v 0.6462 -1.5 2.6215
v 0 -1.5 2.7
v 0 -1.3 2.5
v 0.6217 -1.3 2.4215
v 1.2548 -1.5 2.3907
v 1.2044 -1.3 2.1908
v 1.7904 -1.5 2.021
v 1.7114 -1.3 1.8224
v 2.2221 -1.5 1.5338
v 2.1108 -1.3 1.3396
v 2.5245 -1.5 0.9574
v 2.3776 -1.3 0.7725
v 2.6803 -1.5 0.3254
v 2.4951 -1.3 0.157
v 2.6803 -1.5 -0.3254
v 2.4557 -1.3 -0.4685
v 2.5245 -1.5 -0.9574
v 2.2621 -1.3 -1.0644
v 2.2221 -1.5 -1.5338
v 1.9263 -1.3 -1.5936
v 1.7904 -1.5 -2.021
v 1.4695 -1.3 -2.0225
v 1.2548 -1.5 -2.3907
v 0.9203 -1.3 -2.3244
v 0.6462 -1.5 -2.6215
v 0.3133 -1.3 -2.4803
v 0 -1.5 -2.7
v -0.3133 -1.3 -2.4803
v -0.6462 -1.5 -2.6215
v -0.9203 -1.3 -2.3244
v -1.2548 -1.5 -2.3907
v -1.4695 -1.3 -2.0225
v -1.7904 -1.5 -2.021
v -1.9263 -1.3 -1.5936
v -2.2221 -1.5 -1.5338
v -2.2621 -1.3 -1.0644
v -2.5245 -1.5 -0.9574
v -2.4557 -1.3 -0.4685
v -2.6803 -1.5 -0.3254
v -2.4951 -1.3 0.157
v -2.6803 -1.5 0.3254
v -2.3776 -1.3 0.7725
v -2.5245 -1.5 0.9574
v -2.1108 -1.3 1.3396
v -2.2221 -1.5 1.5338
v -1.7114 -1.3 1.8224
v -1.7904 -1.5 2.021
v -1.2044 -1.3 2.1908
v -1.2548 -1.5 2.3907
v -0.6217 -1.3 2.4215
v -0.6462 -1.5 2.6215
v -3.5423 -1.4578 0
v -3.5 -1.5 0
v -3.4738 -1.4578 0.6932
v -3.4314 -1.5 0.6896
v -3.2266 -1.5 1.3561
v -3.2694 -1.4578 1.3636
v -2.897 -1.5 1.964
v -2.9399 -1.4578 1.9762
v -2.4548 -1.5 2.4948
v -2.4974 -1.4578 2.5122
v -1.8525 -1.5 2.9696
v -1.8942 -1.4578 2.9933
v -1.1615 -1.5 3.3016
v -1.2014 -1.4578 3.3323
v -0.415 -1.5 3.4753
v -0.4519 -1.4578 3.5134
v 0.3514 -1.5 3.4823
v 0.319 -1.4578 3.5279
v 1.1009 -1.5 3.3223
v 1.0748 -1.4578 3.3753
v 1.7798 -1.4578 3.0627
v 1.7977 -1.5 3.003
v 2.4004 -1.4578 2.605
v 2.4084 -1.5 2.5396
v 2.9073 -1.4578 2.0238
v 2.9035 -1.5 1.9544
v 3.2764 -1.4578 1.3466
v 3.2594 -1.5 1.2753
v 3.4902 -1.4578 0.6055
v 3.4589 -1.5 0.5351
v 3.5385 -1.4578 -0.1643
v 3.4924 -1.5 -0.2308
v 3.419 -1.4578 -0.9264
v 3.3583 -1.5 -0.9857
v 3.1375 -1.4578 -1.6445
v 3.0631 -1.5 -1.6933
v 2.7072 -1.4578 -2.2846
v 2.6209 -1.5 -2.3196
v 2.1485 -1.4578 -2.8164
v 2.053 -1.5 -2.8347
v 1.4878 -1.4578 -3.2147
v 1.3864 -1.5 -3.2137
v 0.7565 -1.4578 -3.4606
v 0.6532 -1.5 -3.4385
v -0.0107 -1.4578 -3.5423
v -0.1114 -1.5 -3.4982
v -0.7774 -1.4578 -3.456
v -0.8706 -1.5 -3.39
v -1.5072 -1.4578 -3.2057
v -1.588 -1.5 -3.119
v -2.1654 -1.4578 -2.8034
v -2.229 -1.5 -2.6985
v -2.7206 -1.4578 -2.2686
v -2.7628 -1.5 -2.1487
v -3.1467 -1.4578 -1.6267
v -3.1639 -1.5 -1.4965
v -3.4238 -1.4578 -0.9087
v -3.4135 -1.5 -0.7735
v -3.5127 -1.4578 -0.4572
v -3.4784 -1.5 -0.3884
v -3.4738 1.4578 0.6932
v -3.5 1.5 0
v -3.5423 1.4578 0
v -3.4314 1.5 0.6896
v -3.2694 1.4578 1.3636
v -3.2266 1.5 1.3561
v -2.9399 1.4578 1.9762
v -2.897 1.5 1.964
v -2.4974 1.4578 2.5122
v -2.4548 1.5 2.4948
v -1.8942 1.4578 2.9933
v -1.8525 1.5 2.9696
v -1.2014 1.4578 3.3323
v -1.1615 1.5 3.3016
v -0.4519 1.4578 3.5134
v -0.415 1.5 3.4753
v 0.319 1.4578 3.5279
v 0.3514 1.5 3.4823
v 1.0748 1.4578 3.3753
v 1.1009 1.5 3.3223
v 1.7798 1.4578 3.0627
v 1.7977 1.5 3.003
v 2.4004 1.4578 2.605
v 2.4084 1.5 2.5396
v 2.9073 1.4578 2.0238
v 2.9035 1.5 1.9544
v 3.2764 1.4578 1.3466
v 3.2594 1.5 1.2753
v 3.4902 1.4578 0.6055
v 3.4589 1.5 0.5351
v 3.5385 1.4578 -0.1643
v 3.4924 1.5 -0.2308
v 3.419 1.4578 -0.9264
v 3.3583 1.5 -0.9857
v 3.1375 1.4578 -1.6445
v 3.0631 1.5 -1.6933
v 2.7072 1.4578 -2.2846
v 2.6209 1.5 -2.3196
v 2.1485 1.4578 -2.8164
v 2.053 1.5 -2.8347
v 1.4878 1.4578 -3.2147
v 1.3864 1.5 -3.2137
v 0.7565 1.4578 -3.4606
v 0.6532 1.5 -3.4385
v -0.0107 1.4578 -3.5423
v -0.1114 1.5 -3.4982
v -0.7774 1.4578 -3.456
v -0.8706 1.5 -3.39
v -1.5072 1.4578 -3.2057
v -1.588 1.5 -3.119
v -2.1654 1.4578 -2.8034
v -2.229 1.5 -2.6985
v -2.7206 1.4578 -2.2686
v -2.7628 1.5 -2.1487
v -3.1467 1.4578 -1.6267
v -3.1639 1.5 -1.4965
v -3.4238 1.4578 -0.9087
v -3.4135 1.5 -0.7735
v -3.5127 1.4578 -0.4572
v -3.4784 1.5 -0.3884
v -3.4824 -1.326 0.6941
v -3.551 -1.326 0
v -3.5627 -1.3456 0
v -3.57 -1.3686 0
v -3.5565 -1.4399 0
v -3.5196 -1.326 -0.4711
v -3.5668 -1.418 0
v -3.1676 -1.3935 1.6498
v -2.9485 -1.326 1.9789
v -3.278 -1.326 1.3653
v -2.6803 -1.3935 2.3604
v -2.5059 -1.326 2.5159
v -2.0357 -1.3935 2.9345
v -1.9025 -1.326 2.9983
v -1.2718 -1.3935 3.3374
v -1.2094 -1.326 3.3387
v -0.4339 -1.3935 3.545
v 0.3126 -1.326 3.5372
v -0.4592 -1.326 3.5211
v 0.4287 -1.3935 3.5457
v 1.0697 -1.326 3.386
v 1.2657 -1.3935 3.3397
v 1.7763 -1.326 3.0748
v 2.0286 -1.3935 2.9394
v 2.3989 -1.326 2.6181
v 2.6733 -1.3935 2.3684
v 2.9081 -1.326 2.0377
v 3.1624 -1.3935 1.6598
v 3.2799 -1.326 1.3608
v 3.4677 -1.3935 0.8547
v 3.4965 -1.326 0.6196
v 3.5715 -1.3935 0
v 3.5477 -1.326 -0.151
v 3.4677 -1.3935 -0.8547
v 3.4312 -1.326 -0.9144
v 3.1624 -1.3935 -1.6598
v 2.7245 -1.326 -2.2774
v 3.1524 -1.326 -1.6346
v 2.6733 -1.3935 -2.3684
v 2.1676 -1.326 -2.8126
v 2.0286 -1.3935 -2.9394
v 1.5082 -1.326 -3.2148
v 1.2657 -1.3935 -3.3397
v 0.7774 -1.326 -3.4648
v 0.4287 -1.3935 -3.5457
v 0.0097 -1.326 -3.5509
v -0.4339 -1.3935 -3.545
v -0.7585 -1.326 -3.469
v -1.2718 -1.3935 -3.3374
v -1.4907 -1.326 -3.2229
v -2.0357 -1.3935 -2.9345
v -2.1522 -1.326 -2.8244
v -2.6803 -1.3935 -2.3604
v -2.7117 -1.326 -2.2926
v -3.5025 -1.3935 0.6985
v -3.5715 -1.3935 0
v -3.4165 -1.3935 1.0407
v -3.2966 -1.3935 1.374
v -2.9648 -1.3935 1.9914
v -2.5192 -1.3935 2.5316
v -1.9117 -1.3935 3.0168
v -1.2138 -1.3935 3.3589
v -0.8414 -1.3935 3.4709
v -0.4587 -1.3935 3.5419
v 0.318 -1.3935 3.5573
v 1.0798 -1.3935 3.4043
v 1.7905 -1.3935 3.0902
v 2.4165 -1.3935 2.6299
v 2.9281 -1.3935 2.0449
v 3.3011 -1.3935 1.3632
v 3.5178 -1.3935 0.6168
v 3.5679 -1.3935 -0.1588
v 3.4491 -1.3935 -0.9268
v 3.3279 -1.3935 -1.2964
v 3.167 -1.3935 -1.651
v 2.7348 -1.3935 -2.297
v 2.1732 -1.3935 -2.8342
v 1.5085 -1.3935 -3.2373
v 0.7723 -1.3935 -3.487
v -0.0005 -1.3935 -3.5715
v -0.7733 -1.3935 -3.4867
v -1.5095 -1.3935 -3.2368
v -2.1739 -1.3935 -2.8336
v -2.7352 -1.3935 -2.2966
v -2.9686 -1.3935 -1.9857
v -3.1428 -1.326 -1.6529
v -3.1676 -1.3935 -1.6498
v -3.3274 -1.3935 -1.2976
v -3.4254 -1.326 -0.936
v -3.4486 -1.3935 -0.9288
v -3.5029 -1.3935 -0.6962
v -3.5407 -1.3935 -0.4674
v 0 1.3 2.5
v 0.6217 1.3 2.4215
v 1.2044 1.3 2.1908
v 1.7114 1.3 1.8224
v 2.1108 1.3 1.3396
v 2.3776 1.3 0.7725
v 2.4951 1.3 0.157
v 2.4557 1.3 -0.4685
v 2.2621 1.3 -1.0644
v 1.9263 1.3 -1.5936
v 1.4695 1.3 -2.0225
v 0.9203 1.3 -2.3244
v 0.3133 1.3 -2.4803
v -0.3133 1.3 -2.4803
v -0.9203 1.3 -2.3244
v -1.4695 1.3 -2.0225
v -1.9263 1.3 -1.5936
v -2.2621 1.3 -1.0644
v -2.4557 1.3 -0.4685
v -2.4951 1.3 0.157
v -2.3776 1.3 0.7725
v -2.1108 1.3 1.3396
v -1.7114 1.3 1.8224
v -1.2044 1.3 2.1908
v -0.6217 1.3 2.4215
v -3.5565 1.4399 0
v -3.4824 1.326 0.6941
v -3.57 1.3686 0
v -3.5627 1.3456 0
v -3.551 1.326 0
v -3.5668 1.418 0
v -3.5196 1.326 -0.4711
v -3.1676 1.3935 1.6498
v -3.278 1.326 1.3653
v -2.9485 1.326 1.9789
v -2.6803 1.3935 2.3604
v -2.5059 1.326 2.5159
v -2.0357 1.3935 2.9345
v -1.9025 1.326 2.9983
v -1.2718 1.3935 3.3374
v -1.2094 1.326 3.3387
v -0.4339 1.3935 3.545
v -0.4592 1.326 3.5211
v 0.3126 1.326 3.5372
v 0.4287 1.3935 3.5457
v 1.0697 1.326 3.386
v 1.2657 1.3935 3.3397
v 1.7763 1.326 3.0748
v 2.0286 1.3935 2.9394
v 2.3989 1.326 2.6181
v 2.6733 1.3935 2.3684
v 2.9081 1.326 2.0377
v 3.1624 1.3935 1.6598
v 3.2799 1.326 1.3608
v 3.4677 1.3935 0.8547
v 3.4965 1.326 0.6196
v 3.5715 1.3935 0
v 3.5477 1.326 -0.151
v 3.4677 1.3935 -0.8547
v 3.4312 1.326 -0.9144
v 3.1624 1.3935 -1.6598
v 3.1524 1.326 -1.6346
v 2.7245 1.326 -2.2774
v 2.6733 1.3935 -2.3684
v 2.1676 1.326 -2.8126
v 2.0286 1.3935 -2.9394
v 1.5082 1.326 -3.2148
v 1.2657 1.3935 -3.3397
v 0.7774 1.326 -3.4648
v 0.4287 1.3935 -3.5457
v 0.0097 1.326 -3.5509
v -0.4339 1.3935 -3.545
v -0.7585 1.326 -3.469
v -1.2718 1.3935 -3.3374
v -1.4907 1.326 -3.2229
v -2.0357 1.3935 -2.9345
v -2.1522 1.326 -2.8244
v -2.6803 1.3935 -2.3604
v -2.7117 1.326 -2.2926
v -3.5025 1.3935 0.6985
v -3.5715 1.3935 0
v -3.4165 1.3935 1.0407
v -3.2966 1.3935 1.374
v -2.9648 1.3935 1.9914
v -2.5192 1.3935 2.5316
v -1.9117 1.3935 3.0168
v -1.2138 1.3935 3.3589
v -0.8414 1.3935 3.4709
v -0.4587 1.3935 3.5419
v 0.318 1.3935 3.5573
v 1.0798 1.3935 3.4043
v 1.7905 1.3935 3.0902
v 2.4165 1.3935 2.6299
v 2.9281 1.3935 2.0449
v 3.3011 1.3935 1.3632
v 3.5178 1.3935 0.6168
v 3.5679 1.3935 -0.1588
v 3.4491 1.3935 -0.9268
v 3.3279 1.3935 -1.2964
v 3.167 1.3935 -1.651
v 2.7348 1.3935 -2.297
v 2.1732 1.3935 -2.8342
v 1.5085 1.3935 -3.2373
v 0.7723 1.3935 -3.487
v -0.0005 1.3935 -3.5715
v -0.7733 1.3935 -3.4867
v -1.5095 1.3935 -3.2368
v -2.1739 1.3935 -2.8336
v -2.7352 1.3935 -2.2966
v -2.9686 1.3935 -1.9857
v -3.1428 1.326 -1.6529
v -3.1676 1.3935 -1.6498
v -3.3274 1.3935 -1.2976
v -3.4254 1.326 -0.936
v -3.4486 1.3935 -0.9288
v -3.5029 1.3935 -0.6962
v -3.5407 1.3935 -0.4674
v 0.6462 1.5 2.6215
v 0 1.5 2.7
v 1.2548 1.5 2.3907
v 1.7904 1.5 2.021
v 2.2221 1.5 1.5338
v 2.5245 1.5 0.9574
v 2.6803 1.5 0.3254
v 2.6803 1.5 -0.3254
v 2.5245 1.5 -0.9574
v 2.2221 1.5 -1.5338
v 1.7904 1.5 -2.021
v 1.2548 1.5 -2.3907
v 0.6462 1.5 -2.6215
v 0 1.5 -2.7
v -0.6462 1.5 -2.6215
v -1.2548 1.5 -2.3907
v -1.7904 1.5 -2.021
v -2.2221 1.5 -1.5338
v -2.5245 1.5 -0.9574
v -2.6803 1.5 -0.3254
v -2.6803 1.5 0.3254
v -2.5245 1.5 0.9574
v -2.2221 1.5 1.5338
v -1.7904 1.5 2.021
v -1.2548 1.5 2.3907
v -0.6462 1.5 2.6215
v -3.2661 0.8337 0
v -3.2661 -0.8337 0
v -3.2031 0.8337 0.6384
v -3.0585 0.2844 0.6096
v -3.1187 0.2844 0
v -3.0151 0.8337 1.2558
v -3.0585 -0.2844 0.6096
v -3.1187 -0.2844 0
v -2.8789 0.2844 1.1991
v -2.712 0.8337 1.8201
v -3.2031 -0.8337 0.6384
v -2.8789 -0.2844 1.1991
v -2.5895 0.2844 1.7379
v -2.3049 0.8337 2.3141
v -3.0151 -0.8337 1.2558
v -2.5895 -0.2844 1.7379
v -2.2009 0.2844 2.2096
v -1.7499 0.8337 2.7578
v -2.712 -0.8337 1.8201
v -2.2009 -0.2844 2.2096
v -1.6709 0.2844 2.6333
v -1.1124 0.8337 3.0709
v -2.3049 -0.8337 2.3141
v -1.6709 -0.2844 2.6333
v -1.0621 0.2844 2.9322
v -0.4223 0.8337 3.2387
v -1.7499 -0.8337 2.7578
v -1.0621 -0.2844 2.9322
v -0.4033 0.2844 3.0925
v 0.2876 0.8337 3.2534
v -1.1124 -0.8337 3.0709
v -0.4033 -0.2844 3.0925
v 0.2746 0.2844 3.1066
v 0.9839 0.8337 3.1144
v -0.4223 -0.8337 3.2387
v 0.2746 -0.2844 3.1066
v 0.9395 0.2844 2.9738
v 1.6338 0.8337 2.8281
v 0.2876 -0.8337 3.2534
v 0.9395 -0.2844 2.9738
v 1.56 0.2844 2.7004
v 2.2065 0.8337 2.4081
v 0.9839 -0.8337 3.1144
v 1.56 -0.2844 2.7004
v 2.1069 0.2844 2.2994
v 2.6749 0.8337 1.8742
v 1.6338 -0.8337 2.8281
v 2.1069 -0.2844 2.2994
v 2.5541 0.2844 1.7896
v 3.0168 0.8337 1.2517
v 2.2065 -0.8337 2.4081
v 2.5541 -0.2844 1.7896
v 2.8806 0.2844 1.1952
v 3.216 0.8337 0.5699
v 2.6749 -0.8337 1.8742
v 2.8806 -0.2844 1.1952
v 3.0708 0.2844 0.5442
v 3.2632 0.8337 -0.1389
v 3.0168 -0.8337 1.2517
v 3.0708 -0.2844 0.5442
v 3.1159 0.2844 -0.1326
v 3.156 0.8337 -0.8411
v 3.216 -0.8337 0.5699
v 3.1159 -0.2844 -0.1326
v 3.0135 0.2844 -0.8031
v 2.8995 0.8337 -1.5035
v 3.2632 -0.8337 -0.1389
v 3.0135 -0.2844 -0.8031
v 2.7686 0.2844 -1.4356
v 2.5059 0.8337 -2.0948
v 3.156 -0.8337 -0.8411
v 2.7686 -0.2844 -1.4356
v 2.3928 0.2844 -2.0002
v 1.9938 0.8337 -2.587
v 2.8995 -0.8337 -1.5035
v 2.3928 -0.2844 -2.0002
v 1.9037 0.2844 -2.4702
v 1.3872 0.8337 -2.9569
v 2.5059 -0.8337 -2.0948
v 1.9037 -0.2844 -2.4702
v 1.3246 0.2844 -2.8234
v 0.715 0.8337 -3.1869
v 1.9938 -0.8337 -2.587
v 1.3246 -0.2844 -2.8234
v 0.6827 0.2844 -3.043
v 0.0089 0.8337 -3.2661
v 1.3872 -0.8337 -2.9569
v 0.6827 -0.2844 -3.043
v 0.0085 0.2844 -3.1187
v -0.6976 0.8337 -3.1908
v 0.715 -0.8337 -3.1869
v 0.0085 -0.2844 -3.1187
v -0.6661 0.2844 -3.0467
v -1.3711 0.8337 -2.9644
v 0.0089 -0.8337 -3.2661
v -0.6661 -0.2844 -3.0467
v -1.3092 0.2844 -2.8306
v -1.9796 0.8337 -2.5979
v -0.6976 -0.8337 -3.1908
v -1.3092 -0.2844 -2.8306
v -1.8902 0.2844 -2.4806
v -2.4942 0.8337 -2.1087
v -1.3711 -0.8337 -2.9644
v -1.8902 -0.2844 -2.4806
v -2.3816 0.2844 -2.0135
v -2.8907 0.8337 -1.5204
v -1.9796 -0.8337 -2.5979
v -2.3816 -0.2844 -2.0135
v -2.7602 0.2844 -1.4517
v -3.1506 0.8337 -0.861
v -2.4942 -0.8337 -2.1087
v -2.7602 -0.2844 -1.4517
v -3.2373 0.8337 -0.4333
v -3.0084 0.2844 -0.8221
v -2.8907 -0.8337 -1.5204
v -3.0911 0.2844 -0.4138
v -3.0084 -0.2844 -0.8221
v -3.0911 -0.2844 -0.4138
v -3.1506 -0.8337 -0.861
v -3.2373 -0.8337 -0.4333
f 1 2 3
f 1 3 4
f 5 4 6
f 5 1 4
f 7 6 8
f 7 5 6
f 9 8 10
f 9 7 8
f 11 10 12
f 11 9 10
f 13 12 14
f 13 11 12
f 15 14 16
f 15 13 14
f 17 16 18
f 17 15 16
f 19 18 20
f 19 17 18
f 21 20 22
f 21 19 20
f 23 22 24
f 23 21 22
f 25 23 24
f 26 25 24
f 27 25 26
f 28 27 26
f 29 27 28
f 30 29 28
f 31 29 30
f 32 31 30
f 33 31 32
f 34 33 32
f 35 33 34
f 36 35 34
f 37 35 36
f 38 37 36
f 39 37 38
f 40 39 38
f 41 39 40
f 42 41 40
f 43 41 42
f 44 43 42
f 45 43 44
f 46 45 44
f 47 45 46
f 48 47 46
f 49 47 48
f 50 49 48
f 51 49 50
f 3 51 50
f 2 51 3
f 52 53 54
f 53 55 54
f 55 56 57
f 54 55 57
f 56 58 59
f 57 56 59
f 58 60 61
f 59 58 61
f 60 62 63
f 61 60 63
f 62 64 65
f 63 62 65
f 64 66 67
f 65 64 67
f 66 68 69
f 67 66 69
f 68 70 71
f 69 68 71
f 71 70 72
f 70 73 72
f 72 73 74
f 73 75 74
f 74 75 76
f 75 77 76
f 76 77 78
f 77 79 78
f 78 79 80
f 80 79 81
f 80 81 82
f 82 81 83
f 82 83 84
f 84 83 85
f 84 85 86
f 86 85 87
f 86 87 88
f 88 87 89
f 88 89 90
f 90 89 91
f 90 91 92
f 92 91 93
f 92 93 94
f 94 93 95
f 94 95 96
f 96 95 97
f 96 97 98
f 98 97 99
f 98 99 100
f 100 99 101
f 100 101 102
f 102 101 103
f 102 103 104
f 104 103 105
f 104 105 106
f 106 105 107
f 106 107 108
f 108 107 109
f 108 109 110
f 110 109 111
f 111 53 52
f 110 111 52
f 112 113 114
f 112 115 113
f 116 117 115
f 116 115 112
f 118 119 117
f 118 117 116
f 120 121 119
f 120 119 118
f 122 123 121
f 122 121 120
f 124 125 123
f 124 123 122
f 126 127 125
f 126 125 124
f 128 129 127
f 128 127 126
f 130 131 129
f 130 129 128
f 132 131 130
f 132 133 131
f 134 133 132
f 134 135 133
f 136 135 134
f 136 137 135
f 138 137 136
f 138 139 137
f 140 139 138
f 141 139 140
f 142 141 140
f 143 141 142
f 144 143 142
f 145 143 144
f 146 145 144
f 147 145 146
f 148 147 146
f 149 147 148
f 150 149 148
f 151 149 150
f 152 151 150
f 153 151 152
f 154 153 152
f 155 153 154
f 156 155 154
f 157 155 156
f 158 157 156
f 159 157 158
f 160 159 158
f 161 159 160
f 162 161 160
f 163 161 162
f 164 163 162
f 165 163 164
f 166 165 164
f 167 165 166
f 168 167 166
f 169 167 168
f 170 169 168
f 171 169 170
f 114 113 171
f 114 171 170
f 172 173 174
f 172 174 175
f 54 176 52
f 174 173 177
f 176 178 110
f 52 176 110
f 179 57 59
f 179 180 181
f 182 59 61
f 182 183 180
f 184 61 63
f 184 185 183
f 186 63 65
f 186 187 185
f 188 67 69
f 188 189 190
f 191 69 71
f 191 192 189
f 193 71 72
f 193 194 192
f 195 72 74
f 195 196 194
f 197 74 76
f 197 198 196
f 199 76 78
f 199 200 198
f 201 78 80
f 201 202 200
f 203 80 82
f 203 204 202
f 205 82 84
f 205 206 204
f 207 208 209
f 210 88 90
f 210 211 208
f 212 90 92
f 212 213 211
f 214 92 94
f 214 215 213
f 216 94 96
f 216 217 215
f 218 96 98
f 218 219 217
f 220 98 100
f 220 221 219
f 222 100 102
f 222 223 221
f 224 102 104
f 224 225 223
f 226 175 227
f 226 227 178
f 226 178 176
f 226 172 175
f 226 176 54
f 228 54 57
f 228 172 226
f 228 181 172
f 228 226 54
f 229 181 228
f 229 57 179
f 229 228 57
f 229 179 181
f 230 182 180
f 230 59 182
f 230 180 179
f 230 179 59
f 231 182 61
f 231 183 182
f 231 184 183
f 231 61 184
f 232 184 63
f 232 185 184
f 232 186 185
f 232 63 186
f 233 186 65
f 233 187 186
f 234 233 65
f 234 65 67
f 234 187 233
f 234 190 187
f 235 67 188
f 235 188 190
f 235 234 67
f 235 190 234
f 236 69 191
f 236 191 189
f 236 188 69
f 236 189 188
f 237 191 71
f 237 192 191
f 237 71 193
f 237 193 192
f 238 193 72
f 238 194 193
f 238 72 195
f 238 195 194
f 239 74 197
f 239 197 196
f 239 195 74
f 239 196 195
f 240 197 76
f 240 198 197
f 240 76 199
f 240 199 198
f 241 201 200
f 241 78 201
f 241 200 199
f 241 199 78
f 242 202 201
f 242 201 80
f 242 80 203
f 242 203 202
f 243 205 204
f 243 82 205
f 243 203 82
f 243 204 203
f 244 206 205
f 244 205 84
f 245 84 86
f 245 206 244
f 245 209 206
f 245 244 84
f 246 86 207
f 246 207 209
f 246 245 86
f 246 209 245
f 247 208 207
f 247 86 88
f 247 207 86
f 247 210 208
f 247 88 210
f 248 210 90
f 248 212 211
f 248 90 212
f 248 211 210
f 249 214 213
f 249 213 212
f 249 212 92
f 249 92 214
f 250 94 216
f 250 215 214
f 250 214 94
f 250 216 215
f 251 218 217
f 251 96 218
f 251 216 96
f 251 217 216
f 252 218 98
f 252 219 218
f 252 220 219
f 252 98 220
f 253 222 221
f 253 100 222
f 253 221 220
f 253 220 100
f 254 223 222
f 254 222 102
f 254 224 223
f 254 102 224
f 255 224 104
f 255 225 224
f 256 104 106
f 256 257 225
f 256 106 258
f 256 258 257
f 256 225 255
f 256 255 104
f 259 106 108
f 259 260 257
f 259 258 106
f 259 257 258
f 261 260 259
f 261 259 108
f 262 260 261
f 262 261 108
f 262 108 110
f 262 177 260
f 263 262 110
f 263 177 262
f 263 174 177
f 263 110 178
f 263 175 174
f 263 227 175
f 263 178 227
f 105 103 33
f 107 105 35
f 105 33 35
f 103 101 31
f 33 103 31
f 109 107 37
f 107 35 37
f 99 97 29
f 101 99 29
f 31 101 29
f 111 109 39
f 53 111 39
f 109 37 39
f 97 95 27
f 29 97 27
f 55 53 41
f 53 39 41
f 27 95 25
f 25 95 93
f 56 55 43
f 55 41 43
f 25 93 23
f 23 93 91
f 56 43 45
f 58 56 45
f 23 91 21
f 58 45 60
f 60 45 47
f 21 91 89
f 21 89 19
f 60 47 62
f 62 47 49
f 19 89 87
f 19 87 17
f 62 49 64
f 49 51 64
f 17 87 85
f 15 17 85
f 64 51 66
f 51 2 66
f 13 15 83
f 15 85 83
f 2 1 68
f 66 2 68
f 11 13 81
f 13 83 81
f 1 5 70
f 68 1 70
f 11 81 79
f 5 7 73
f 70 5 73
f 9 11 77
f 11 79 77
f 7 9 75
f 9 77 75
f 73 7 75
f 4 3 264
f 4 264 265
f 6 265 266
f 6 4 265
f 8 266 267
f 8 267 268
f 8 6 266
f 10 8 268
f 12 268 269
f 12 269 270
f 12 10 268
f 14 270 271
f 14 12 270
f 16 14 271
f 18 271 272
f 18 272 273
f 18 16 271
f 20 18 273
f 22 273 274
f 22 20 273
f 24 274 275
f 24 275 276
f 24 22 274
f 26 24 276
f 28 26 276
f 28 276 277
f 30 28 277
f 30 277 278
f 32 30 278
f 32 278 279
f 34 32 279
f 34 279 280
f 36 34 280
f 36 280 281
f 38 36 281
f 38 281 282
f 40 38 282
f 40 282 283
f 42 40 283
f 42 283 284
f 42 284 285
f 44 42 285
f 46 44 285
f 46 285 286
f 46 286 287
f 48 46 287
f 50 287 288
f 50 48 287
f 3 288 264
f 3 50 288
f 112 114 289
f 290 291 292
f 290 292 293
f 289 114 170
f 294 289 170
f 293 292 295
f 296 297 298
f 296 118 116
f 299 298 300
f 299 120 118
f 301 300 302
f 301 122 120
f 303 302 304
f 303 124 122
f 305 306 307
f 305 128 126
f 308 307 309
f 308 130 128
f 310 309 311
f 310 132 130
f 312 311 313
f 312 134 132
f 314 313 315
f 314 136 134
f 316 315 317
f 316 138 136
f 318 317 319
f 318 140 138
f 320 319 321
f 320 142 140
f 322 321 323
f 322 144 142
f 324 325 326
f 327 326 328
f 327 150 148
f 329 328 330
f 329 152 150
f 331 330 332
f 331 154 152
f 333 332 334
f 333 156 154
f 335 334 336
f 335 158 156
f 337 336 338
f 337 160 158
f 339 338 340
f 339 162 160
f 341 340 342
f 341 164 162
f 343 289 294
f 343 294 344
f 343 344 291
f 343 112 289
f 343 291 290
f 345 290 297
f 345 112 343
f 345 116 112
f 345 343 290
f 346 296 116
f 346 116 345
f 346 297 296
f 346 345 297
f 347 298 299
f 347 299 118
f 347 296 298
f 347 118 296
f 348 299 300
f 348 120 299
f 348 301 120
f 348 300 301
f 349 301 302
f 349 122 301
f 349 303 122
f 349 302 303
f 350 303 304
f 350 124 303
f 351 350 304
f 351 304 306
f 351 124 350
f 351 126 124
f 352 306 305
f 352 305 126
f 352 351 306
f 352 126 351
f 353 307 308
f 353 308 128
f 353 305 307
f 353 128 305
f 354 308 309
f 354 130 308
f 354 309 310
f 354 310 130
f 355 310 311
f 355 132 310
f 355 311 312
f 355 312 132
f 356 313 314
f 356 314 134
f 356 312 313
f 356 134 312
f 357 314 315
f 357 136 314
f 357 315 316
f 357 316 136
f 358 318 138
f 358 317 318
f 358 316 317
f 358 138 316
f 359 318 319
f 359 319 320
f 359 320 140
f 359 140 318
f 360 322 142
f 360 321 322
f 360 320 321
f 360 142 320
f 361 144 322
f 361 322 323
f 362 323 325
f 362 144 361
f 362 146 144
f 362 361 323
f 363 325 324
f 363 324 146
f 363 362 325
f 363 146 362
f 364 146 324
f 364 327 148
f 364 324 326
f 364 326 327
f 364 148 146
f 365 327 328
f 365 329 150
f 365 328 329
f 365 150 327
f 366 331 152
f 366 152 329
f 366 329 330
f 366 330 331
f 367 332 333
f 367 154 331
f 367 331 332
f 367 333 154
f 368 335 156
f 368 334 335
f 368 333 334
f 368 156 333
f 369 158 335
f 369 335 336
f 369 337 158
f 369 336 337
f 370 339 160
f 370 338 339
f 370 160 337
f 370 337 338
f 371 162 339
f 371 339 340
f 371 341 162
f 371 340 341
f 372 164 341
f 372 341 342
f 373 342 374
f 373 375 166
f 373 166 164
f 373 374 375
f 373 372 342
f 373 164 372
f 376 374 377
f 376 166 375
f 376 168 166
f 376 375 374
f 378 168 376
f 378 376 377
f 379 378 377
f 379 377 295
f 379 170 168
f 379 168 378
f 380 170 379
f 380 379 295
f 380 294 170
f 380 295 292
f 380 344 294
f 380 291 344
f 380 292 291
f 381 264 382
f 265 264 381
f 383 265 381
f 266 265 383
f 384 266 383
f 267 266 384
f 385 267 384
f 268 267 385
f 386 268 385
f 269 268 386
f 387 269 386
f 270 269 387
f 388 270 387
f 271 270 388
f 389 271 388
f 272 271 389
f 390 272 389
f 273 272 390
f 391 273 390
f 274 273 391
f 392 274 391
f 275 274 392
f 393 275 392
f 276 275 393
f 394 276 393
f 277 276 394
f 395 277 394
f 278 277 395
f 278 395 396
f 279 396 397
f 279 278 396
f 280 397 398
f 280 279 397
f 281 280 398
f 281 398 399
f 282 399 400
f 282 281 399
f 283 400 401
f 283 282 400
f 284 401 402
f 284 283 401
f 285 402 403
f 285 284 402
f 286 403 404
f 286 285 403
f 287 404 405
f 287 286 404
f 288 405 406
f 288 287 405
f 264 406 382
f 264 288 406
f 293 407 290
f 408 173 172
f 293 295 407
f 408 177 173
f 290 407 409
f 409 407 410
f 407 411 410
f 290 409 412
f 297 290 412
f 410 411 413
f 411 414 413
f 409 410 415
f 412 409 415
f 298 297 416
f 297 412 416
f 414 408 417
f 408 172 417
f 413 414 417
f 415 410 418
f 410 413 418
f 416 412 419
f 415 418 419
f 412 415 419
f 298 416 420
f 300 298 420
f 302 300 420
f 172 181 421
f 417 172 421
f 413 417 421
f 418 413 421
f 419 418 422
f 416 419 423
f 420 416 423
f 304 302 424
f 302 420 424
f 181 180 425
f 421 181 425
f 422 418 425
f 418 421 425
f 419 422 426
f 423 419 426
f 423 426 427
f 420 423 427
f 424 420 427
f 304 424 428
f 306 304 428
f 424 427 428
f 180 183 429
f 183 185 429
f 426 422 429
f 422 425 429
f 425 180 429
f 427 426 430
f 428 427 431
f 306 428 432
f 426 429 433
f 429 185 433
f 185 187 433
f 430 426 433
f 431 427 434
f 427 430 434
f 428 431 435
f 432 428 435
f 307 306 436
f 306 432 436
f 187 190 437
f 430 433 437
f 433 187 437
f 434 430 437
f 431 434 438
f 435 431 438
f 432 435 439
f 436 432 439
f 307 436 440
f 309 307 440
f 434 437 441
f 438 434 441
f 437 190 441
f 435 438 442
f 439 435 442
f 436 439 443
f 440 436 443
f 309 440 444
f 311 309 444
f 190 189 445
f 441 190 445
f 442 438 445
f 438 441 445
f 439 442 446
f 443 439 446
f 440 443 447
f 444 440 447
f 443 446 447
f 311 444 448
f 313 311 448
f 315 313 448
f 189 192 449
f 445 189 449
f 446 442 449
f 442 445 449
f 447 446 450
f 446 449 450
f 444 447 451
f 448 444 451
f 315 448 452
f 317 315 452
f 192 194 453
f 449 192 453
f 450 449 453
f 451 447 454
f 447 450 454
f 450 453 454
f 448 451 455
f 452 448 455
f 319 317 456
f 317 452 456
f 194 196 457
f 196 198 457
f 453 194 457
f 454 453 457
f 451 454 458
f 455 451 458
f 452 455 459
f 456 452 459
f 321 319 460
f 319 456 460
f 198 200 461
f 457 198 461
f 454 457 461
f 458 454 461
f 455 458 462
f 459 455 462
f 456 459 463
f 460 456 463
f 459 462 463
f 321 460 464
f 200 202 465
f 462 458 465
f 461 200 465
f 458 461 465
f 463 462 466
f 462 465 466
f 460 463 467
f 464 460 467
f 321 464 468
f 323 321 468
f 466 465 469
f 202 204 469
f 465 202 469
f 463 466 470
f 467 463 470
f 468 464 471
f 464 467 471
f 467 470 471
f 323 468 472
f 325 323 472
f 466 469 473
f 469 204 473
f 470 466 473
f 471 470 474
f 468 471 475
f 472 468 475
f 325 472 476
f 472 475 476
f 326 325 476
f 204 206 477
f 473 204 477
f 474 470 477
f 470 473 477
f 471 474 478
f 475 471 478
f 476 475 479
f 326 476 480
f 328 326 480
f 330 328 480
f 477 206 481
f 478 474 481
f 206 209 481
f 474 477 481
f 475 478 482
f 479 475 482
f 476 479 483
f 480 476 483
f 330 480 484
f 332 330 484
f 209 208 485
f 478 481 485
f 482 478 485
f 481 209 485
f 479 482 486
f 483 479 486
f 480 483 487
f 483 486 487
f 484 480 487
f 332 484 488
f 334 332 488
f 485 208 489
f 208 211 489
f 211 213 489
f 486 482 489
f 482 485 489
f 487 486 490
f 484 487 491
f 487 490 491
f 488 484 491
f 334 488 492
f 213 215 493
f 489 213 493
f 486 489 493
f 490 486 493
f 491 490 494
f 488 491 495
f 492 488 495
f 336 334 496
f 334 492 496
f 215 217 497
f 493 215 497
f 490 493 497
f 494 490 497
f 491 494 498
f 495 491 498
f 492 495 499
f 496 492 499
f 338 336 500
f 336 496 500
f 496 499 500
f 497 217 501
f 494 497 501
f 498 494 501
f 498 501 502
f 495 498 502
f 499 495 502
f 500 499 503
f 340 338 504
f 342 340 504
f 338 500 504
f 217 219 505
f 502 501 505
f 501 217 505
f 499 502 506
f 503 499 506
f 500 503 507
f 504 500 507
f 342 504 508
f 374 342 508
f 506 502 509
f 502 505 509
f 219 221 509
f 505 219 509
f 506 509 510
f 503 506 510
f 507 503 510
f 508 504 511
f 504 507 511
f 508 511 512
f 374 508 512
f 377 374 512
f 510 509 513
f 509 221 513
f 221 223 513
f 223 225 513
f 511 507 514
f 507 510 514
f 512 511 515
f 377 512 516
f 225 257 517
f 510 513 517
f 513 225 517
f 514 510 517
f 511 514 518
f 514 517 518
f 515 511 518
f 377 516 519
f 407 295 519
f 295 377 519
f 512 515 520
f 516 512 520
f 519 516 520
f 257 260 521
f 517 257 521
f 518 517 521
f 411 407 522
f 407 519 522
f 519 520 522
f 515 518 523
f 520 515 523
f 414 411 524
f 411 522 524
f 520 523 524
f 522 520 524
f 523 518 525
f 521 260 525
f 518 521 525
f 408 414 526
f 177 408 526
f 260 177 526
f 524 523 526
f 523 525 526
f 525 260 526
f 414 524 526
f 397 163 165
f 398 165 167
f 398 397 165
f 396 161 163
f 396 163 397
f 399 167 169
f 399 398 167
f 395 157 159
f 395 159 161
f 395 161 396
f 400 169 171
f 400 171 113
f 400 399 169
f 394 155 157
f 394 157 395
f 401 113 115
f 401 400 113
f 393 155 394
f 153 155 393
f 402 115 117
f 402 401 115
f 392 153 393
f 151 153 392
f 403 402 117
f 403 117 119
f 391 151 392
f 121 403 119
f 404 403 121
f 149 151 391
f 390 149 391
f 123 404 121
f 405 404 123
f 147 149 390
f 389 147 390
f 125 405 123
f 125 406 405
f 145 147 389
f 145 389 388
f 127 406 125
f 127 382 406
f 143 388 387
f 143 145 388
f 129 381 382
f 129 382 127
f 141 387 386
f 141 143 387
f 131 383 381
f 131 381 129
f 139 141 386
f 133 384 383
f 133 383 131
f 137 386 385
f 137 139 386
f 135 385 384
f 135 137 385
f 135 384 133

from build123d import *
from OCP.BRepFilletAPI import BRepFilletAPI_MakeChamfer

# Parameters (mm, degrees)
SKETCH1_R           = 3.7
SKETCH1_R_2         = 2.5
BOSS_EXTRUDE1_DEPTH = 1.5
CHAMFER1_SIZE       = 0.2
CHAMFER1_SIZE2      = 0.14146341463414658
CHAMFER2_SIZE       = 0.2
CHAMFER2_SIZE2      = 0.14146341463414658
FILLET1_R           = 0.1


with BuildPart() as part:
    # Sketch1 → Boss-Extrude1 (new, symmetric)
    with BuildSketch(Plane(origin=(0, 0, 0), x_dir=(1, 0, 0), z_dir=(0, 1, 0))):
        with Locations(Location((0, 0, 0), (0, 0, 270))):
            Circle(SKETCH1_R)
        with Locations(Location((0, 0, 0), (0, 0, 270))):
            Circle(SKETCH1_R_2, mode=Mode.SUBTRACT)
    extrude(amount=BOSS_EXTRUDE1_DEPTH, both=True)

    # Cut-Sweep1: sweep along a curve in space
    with BuildLine() as cut_sweep1_path:
        ThreePointArc((0, 1.5, 3.7), (2.6162950903902256, 1.5, 2.616295090390226), (3.7, 1.5, 0))
        ThreePointArc((3.7, 1.5, 0), (2.616295090390226, 1.5, -2.6162950903902256), (0, 1.5, -3.7))
        ThreePointArc((0, 1.5, -3.7), (-2.6162950903902256, 1.5, -2.616295090390226), (-3.7, 1.5, 0))
        ThreePointArc((-3.7, 1.5, 0), (-2.616295090390226, 1.5, 2.6162950903902256), (0, 1.5, 3.7))
    # Sketch2 → Cut-Sweep1 (sweep, cut)
    with BuildSketch(Plane(origin=(0, 0, 0), x_dir=(0, 0, -1), z_dir=(1, 0, 0))):
        with BuildLine():
            Line((-3.7, -1.5), (-3.7, 1.5))
            ThreePointArc((-3.7, 1.5), (-3.099999999999999, -3.3e-16), (-3.7, -1.5))
        make_face()
    sweep(path=cut_sweep1_path.line, mode=Mode.SUBTRACT)

    # Chamfer1: one chamfer whose edges measure the first distance from different faces: ONE call of the kernel's chamfer builder (chamfer() names one face for all edges)
    chamfer1_edges_1 = [part.edges().sort_by_distance(p)[0] for p in [
        (7.7e-16, -1.5, -2.5),
        (7.7e-16, 1.5, -2.5),
    ]]
    chamfer1_edges_2 = [part.edges().sort_by_distance(p)[0] for p in [
        (3.700000000000001, -1.5, 7e-16),
    ]]
    chamfer1_side_2 = [part.faces().sort_by_distance(p)[0] for p in [
        (3.595348196384392, -1.5, 6.7e-16),
    ]]
    chamfer1 = BRepFilletAPI_MakeChamfer(part.part.solid().wrapped)
    for e in chamfer1_edges_1:
        chamfer1.Add(CHAMFER1_SIZE, e.wrapped)
    for e in chamfer1_edges_2:
        chamfer1.Add(CHAMFER1_SIZE, CHAMFER1_SIZE2, e.wrapped, chamfer1_side_2[0].wrapped)  # the first distance lies on this face
    add(Compound.cast(chamfer1.Shape()), mode=Mode.REPLACE)

    # Chamfer2
    chamfer2_edges = [part.edges().sort_by_distance(p)[0] for p in [
        (3.700000000000001, 1.5, 7e-16),
    ]]
    chamfer2_side = [part.faces().sort_by_distance(p)[0] for p in [
        (8.6e-16, 1.5, -2.8046518036156094),
    ]]
    chamfer(chamfer2_edges, length=CHAMFER2_SIZE, length2=CHAMFER2_SIZE2, reference=chamfer2_side[0])

    # Fillet1
    fillet1_edges = [part.edges().sort_by_distance(p)[0] for p in [
        (3.6058210568322178, 1.394442443584041, 8.37383e-12),
        (3.605821056832176, -1.3944424435840415, -2.9301e-13),
    ]]
    fillet(fillet1_edges, radius=FILLET1_R)


solid = part.part
